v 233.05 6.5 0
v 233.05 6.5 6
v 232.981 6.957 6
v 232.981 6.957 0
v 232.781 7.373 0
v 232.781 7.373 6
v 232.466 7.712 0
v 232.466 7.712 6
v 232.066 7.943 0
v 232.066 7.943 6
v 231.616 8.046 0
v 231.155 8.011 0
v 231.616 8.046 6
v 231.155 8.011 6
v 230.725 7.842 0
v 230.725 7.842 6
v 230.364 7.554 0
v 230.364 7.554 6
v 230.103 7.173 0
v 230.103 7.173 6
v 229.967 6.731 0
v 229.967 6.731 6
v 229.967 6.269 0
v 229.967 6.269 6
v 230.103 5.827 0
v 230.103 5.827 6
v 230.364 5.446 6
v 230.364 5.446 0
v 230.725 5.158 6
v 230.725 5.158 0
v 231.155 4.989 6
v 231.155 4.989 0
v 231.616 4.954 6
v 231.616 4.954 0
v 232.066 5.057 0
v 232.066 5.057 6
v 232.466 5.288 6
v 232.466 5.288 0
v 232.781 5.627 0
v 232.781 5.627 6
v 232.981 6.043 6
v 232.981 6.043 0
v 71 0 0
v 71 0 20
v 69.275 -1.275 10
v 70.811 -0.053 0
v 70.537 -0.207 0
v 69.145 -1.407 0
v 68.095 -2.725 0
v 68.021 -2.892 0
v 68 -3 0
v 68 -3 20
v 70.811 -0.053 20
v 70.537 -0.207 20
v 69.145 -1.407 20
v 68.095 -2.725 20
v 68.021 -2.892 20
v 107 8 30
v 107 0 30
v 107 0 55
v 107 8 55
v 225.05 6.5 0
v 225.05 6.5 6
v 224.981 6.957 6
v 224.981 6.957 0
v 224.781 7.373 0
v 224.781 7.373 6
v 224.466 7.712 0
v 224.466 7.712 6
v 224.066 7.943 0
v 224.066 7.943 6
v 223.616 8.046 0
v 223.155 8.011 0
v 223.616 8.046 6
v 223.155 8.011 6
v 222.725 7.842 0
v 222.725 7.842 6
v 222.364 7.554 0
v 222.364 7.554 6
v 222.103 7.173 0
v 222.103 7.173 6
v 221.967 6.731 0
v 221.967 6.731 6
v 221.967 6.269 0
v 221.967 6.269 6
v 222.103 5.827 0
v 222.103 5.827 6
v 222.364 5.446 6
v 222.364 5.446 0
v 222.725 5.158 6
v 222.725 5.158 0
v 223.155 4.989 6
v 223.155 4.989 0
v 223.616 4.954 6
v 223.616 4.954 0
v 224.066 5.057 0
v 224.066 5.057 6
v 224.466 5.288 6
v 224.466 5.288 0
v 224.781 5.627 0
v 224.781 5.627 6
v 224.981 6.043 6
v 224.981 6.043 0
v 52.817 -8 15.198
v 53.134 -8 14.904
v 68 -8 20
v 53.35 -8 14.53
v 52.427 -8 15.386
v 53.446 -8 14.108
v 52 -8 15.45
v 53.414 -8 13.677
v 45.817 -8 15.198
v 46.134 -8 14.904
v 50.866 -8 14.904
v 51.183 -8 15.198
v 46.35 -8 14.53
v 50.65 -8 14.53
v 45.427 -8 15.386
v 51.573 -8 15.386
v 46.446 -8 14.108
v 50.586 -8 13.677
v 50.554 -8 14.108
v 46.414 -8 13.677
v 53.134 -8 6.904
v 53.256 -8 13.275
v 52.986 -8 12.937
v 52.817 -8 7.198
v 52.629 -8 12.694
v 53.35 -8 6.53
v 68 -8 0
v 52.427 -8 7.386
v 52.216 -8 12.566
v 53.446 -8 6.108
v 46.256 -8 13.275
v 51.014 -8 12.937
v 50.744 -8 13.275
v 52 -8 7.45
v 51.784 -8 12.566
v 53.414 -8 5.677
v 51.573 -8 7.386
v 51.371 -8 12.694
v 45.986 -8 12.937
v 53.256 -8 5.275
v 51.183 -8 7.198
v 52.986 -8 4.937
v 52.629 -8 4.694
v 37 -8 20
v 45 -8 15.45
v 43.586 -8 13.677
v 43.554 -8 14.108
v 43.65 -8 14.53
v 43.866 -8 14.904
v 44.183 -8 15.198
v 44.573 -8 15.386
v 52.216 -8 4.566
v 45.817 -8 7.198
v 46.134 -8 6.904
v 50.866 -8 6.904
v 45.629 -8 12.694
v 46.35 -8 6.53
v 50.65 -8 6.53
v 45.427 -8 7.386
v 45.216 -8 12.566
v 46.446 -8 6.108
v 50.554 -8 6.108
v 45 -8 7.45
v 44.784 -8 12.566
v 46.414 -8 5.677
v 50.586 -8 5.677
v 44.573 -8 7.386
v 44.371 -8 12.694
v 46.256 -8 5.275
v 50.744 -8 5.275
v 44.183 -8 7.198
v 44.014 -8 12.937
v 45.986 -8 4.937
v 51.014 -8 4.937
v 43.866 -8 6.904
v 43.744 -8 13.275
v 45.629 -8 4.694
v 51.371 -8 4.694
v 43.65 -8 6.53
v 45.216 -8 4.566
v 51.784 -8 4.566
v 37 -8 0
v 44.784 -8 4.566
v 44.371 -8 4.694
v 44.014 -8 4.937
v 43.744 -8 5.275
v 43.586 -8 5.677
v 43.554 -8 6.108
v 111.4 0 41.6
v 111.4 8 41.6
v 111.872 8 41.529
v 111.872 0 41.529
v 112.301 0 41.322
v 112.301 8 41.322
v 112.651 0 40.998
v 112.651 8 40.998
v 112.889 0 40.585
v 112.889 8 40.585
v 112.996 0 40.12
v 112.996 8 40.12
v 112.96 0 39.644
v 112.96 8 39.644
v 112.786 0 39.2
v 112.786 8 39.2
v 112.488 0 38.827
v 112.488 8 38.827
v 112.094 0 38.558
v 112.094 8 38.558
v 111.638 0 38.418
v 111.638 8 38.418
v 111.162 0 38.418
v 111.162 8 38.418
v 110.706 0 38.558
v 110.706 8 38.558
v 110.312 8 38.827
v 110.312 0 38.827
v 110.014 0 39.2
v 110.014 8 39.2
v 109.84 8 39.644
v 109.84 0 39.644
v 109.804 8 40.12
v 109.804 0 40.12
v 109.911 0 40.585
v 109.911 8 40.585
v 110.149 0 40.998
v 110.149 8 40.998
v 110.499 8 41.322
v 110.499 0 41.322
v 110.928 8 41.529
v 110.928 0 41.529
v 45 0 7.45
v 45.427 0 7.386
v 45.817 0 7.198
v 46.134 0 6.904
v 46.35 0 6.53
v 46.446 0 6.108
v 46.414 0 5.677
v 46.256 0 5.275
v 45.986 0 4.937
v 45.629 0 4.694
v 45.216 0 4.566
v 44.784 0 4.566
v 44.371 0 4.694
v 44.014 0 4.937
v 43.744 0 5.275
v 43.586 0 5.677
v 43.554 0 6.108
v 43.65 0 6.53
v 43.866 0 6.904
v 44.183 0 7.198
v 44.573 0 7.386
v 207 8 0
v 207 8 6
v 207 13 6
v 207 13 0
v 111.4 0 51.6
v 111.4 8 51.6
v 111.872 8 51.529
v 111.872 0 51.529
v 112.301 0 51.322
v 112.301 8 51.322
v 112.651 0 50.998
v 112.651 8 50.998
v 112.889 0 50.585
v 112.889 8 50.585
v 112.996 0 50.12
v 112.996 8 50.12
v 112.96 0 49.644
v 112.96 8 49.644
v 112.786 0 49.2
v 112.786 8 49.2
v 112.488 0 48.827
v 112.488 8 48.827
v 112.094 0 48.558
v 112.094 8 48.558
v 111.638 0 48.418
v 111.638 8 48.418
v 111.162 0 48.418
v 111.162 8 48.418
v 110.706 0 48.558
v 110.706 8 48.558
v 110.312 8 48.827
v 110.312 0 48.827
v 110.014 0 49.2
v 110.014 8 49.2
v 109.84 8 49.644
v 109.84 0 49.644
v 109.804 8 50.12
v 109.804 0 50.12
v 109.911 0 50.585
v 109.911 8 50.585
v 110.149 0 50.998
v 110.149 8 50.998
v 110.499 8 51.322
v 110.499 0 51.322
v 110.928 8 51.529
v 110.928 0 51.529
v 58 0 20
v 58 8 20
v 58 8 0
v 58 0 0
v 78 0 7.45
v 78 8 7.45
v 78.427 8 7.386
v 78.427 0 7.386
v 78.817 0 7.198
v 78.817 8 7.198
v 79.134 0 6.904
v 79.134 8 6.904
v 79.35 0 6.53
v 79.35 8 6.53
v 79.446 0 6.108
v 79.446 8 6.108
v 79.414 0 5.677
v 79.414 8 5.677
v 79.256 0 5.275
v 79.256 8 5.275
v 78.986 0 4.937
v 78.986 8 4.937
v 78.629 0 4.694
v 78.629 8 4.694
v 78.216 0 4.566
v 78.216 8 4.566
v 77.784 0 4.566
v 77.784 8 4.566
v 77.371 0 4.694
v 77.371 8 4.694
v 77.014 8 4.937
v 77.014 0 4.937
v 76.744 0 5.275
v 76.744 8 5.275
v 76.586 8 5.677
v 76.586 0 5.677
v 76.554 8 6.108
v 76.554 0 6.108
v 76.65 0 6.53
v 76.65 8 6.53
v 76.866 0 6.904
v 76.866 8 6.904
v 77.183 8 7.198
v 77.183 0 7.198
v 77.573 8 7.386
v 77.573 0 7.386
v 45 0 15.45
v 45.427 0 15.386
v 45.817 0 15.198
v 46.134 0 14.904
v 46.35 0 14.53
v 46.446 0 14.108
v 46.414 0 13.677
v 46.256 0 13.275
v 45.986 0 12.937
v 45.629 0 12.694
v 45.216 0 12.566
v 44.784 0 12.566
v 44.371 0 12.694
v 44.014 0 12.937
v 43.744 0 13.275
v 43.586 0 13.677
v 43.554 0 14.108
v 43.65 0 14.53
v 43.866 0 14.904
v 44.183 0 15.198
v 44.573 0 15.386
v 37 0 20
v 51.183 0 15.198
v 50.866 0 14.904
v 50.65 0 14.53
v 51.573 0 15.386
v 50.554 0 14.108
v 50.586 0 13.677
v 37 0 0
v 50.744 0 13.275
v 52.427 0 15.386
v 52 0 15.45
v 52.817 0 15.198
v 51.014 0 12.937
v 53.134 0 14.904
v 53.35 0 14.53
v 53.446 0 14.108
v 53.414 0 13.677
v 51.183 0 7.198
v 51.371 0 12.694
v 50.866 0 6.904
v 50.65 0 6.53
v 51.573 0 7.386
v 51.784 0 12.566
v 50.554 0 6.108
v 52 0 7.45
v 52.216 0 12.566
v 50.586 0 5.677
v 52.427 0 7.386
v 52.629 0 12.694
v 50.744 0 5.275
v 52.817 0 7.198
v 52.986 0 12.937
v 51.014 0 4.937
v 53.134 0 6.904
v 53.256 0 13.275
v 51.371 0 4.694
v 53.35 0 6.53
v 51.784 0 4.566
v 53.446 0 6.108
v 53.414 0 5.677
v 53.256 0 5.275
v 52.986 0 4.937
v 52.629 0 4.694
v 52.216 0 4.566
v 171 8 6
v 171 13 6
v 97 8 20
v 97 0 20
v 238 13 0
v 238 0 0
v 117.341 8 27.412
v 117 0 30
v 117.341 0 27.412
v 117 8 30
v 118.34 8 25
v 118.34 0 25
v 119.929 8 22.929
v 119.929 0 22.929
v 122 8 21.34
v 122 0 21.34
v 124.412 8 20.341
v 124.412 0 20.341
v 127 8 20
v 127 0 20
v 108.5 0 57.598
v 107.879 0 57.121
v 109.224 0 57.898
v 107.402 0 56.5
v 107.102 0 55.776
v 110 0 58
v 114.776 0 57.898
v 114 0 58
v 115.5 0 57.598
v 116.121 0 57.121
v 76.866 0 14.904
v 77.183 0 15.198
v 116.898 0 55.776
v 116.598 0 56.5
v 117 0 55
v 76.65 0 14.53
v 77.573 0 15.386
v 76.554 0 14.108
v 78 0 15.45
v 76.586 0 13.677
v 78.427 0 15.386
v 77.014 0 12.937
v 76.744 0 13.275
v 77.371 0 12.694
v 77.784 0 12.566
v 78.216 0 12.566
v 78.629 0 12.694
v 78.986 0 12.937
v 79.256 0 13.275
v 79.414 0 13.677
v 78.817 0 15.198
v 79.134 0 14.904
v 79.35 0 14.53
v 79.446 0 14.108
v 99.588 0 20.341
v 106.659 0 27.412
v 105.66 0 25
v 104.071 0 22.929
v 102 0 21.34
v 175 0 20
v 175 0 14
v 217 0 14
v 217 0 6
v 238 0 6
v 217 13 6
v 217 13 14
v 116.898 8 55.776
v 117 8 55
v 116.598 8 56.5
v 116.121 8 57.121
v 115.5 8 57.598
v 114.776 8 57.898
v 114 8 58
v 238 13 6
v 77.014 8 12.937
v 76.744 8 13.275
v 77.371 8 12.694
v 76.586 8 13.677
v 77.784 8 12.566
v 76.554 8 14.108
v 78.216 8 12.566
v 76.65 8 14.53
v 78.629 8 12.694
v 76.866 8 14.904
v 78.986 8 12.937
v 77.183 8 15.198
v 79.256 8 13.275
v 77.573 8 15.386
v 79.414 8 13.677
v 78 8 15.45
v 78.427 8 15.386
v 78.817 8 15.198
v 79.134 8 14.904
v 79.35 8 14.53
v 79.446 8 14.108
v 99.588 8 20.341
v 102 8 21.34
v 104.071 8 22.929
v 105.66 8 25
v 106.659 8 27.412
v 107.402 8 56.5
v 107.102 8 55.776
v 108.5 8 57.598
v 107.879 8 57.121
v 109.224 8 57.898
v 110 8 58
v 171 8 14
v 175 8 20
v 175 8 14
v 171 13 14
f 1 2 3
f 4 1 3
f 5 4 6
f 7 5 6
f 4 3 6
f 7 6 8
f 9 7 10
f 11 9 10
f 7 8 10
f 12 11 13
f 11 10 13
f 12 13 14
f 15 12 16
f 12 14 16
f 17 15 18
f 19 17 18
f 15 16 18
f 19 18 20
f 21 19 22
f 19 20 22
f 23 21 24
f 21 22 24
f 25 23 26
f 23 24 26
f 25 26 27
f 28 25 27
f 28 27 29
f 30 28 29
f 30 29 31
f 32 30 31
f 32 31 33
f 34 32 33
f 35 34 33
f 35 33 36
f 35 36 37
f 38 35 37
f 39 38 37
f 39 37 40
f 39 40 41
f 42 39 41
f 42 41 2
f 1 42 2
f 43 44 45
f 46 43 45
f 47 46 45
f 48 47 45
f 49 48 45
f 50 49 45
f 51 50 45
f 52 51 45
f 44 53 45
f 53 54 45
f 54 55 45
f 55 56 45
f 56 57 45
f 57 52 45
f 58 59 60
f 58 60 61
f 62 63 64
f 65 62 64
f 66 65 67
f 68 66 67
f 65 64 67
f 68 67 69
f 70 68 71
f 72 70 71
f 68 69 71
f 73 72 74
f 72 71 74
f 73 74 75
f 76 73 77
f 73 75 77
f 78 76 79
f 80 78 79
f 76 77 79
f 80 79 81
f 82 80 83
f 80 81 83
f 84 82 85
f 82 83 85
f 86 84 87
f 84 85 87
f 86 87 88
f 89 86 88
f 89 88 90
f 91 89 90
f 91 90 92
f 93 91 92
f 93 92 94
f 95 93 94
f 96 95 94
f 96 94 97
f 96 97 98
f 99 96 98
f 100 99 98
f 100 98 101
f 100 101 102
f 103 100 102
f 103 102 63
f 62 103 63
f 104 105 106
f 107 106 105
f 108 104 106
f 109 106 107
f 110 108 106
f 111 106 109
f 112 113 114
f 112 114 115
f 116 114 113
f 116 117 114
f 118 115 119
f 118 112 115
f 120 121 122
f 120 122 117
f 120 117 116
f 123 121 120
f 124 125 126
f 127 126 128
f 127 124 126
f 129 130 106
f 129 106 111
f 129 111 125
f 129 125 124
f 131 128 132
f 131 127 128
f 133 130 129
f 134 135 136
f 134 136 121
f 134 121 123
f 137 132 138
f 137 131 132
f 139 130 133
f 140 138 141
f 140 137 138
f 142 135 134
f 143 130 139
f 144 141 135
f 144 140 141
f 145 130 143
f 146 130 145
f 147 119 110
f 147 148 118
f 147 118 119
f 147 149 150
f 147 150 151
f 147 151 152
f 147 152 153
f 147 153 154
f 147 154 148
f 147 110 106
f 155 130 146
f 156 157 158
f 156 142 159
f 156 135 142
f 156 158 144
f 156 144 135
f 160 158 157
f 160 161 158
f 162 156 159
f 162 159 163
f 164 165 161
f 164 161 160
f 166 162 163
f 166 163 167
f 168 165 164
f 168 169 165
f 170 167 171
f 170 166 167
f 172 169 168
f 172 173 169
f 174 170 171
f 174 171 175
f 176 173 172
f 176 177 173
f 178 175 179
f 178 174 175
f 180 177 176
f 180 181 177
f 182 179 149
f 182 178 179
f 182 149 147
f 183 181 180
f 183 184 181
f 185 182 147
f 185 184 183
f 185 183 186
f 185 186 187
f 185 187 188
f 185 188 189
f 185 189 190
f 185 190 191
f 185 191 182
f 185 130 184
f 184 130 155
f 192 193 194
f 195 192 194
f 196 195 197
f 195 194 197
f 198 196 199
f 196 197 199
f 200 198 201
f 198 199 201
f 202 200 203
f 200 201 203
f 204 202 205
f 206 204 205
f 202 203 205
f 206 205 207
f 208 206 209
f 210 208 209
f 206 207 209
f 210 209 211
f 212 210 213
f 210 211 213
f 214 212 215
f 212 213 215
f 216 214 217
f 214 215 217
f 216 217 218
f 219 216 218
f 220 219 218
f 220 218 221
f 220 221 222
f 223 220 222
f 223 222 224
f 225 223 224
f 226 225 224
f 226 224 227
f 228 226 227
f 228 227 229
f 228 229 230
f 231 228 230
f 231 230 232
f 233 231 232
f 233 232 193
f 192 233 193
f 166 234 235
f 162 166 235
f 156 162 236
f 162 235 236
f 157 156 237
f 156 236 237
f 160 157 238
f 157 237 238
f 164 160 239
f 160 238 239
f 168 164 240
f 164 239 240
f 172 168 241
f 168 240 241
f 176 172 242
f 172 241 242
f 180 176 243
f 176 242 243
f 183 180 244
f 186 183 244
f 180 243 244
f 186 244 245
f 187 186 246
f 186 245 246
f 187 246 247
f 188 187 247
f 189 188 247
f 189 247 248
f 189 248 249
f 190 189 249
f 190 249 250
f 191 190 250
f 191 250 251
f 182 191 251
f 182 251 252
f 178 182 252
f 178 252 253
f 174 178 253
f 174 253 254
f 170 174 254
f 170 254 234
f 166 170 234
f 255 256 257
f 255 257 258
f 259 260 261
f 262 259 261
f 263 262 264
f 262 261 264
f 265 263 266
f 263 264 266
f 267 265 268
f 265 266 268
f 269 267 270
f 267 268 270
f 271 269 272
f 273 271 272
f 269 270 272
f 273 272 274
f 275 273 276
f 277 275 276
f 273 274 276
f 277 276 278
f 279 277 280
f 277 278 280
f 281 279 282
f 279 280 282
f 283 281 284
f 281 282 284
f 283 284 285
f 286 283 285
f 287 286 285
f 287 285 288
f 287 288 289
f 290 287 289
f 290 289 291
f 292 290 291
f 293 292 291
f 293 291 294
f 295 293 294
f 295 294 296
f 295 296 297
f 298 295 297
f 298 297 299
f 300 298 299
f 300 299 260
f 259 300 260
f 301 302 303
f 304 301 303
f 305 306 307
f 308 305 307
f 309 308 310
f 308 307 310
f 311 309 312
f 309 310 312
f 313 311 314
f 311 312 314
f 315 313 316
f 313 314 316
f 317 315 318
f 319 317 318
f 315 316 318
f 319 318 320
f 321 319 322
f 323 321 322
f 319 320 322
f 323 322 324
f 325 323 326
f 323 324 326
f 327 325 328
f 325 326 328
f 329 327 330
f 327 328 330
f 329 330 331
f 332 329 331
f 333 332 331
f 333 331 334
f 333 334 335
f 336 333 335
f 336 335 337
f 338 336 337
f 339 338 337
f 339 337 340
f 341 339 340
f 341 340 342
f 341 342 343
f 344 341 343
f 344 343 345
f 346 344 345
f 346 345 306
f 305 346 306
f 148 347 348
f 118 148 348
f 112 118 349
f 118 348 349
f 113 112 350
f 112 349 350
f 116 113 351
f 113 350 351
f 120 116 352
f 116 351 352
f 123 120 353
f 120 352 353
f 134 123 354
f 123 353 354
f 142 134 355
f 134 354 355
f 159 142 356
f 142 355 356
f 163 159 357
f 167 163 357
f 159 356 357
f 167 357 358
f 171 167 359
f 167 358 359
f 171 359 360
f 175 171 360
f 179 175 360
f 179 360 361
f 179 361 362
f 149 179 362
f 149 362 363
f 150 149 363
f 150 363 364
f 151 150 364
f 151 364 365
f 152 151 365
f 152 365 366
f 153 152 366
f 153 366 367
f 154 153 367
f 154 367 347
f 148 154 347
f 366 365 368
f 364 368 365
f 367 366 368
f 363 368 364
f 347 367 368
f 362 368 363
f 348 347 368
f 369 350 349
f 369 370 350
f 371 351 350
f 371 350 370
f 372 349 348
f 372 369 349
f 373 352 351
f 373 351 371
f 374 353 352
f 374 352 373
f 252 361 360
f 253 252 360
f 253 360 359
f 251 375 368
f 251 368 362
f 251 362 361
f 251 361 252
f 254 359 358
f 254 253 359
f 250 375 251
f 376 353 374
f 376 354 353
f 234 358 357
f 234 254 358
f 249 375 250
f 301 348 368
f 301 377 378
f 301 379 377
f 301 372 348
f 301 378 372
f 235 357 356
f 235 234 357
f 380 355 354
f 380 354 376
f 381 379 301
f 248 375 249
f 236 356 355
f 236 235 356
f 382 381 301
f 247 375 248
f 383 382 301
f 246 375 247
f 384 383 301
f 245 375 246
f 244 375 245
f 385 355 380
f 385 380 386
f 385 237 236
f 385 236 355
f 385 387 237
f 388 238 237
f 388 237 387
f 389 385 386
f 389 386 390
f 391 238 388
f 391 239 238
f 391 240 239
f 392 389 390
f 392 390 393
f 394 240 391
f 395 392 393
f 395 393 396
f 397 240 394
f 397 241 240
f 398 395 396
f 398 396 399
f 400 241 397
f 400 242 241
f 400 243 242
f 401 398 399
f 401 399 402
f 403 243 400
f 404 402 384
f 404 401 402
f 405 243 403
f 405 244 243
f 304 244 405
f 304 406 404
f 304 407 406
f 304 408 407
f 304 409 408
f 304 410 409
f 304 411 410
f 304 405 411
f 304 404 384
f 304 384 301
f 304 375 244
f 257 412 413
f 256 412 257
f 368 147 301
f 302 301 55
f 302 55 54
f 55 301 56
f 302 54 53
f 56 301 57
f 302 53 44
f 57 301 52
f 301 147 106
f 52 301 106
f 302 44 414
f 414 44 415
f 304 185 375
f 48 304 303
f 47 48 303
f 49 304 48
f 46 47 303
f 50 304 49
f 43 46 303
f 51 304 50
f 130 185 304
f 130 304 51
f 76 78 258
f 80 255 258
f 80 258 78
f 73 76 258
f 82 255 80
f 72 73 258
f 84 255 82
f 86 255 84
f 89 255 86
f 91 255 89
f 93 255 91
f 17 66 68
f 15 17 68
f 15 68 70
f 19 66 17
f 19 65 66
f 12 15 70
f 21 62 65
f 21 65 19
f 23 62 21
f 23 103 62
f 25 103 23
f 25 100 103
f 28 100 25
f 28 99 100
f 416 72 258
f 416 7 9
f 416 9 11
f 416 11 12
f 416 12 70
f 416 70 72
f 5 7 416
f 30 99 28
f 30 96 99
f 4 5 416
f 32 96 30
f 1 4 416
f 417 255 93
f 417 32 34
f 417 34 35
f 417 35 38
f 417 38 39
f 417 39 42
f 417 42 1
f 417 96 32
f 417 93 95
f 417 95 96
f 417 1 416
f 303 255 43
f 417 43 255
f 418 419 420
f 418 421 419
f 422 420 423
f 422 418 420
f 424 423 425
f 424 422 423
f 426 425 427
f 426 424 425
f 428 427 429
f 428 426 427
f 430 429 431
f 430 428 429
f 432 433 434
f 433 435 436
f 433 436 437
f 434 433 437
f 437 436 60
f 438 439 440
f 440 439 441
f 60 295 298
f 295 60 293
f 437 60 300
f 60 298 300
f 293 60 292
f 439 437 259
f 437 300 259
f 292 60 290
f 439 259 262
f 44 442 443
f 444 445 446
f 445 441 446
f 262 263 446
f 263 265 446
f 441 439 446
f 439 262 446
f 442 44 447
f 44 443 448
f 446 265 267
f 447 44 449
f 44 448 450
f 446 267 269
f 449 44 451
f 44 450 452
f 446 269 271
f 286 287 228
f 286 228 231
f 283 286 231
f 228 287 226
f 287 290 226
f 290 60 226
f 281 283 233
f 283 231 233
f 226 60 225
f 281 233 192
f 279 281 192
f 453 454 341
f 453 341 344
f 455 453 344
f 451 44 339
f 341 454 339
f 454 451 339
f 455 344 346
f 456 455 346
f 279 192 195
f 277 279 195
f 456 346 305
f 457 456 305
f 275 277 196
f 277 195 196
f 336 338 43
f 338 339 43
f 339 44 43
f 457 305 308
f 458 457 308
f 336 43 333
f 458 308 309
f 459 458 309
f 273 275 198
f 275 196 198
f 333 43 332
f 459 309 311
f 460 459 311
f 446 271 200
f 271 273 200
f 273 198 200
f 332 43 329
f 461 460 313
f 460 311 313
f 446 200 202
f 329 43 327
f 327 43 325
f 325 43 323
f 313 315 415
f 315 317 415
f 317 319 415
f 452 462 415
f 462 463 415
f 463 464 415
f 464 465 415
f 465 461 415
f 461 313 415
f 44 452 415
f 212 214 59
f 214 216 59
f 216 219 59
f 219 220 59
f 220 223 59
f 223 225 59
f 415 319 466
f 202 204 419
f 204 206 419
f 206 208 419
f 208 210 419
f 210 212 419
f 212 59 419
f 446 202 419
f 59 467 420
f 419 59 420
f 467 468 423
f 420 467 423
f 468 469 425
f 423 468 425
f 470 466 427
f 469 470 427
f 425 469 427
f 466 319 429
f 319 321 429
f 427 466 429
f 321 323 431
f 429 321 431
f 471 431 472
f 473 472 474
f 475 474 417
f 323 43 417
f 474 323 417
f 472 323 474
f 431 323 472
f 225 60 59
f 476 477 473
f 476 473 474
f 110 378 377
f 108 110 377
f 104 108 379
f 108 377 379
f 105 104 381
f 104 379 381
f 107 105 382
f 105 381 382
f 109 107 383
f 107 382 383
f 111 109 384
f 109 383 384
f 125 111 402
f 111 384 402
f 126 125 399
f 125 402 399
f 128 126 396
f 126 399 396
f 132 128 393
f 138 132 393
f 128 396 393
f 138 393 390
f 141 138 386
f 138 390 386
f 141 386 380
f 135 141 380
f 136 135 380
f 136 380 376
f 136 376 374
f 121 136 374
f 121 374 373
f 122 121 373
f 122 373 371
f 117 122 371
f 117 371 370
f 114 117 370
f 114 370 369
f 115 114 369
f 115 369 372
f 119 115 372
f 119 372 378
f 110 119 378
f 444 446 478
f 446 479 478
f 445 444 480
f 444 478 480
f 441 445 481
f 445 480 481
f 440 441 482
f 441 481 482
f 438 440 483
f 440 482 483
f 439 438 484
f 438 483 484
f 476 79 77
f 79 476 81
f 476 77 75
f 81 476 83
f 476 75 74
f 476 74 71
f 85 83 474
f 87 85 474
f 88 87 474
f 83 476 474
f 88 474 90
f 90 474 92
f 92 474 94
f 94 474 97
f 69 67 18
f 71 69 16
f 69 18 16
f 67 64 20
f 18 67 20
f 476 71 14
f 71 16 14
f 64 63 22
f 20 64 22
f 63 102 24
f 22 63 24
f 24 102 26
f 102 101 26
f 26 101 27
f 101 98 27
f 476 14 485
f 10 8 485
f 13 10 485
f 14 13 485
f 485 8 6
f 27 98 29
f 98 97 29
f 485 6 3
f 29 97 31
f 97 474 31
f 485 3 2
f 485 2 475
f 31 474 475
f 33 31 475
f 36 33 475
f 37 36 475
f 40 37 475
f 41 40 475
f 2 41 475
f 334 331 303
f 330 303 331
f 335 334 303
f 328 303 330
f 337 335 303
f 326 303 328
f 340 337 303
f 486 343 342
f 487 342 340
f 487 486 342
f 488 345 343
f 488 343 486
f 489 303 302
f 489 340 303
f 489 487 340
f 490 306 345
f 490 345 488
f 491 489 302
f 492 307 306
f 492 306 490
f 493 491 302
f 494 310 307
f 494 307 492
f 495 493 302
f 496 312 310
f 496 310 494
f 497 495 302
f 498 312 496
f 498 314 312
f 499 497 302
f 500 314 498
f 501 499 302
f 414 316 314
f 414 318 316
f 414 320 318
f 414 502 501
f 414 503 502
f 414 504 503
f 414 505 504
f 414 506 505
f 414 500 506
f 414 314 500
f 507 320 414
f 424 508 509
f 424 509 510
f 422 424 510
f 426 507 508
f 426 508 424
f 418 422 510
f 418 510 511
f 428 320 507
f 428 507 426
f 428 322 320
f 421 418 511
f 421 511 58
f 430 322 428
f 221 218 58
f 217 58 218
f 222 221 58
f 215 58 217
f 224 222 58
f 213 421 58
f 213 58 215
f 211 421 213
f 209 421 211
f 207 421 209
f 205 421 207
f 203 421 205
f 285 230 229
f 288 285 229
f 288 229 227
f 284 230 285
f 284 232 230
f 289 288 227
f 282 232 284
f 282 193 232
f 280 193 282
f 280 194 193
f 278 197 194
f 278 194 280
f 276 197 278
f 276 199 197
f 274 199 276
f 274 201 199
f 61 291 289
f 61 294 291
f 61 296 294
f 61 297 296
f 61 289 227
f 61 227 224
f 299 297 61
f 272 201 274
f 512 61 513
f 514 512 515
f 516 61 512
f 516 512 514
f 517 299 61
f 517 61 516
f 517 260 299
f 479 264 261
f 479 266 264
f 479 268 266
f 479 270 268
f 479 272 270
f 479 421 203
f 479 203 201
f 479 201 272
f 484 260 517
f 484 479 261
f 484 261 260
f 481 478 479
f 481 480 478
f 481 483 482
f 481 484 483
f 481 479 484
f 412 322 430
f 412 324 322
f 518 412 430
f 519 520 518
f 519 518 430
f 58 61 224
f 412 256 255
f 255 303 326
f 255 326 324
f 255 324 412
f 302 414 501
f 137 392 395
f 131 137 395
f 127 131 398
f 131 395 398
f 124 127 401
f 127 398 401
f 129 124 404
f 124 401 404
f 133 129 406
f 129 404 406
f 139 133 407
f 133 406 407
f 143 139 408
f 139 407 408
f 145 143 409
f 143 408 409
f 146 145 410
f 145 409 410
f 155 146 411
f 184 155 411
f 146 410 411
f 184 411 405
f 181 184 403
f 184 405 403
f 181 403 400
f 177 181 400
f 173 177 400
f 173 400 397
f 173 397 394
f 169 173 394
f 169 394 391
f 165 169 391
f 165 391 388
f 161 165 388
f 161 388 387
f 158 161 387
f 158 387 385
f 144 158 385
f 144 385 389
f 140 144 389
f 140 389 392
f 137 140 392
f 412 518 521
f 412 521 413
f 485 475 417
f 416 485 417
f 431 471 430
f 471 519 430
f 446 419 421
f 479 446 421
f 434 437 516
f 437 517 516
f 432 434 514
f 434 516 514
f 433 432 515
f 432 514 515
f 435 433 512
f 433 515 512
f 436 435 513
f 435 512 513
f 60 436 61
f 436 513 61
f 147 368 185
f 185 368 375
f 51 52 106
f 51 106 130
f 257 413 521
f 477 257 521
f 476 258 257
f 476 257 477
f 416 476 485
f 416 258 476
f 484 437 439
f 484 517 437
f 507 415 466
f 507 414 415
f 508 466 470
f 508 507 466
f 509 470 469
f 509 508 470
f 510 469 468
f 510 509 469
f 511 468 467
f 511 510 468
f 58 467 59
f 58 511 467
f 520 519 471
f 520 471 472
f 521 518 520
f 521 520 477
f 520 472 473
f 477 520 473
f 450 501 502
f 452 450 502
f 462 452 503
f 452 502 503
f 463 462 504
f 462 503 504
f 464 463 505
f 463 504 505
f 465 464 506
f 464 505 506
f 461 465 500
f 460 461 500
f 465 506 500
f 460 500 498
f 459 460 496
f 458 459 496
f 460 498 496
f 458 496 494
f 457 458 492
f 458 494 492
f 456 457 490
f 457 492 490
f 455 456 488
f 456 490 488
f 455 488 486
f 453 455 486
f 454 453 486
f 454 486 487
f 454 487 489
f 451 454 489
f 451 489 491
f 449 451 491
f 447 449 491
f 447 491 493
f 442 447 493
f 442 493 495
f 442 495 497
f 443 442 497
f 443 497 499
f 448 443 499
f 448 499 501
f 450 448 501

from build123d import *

# Parameters (mm, degrees)
SKETCH1_W                 = 300
SKETCH1_H                 = 20
BOSS_EXTRUDE1_DEPTH       = 8
SKETCH2_W                 = 34
SKETCH2_H                 = 8
BOSS_EXTRUDE2_DEPTH       = 9
SKETCH3_W                 = 34
SKETCH3_H                 = 8
BOSS_EXTRUDE3_DEPTH       = 9
SKETCH4_R                 = 1.45
CUT_EXTRUDE1_DEPTH        = 302.504560496
SKETCH5_W                 = 25
SKETCH5_H                 = 8
BOSS_EXTRUDE4_DEPTH       = 17
SKETCH6_W                 = 25
SKETCH6_H                 = 8
BOSS_EXTRUDE5_DEPTH       = 17
SKETCH12_W                = 8
SKETCH12_H                = 8
BOSS_EXTRUDE7_DEPTH       = 17
BOSS_EXTRUDE8_DEPTH       = 12
SKETCH15_R                = 1.6
CUT_EXTRUDE7_DEPTH        = 20
SKETCH16_W                = 20
SKETCH16_H                = 13
BOSS_EXTRUDE9_DEPTH       = 12
SKETCH17_R                = 1.6
CUT_EXTRUDE8_DEPTH        = 20
SKETCH18_W                = 20
SKETCH18_H                = 13
BOSS_EXTRUDE10_DEPTH      = 12
CUT_EXTRUDE9_START        = -20
SKETCH19_R                = 1.6
CUT_EXTRUDE9_DEPTH        = 20
SKETCH20_W                = 20
SKETCH20_H                = 13
BOSS_EXTRUDE11_DEPTH      = 12
CUT_EXTRUDE10_START       = -20
SKETCH21_R                = 1.6
CUT_EXTRUDE10_DEPTH       = 20
SKETCH22_W                = 10
SKETCH22_H                = 38
CUT_EXTRUDE11_DEPTH       = 306.0983448
SKETCH23_W                = 8
SKETCH23_H                = 18
CUT_EXTRUDE12_DEPTH       = 4
BOSS_EXTRUDE12_DEPTH      = 10
BOSS_EXTRUDE13_DEPTH      = 8
SKETCH26_W                = 8
SKETCH26_H                = 48
BOSS_EXTRUDE14_DEPTH      = 14
SKETCH27_W                = 8
SKETCH27_H                = 16
BOSS_EXTRUDE15_DEPTH      = 14
SKETCH28_W                = 8
SKETCH28_H                = 40
CUT_EXTRUDE13_DEPTH       = 14
SKETCH30_W                = 16
SKETCH30_H                = 14
BOSS_EXTRUDE16_DEPTH      = 9
SKETCH31_W                = 17
SKETCH31_H                = 8
CUT_EXTRUDE14_DEPTH       = 5
SKETCH32_W                = 16
SKETCH32_H                = 9
CUT_EXTRUDE15_DEPTH       = 9
CUT_EXTRUDE16_DEPTH       = 10
SKETCH34_W                = 7
SKETCH34_H                = 5
CUT_EXTRUDE17_DEPTH       = 5
SKETCH35_W                = 7
SKETCH35_H                = 5
BOSS_EXTRUDE17_DEPTH      = 5
SKETCH36_R                = 1.7
CUT_EXTRUDE18_DEPTH       = 307.014705529
SKETCH37_W                = 70
SKETCH37_H                = 8
BOSS_EXTRUDE18_DEPTH      = 5
SKETCH39_W                = 66
SKETCH39_H                = 6
CUT_EXTRUDE19_DEPTH       = 306.14258962
SKETCH40_W                = 20
SKETCH40_H                = 12
BOSS_EXTRUDE19_DEPTH      = 10
BOSS_EXTRUDE20_DEPTH      = 5
BOSS_EXTRUDE20_DEPTH_BACK = 5
SKETCH41_W                = 28
SKETCH41_H                = 12
SKETCH42_R                = 1.5
CUT_EXTRUDE20_DEPTH       = 15
SKETCH43_W                = 20
SKETCH43_H                = 12
BOSS_EXTRUDE21_DEPTH      = 10
BOSS_EXTRUDE22_DEPTH      = 5
BOSS_EXTRUDE22_DEPTH_BACK = 5
SKETCH44_W                = 28
SKETCH44_H                = 12
SKETCH45_R                = 1.5
CUT_EXTRUDE21_DEPTH       = 15
SKETCH46_W                = 20
SKETCH46_H                = 12
SKETCH46_W_2              = 19.974984355
BOSS_EXTRUDE23_DEPTH      = 10
BOSS_EXTRUDE24_DEPTH      = 5
BOSS_EXTRUDE24_DEPTH_BACK = 5
SKETCH47_W                = 28
SKETCH47_H                = 12
SKETCH47_W_2              = 28.025015645
CUT_EXTRUDE22_START       = -15
SKETCH48_R                = 1.5
CUT_EXTRUDE22_DEPTH       = 15
FILLET1_R                 = 5
FILLET2_R                 = 2.5
FILLET3_R                 = 3
FILLET4_R                 = 3
SKETCH49_R                = 1.45
CUT_EXTRUDE23_DEPTH       = 309.139578763
SKETCH50_W                = 97.606758594
SKETCH50_H                = 58.271300894
CUT_EXTRUDE24_DEPTH       = 40
SKETCH51_W                = 104.080215225
SKETCH51_H                = 68.777983442
CUT_EXTRUDE25_DEPTH       = 65
SKETCH54_W                = 8
SKETCH54_H                = 13
CUT_EXTRUDE26_DEPTH       = 21
SKETCH55_W                = 31
SKETCH55_H                = 6
BOSS_EXTRUDE26_DEPTH      = 5
SKETCH56_R                = 1.55
CUT_EXTRUDE27_DEPTH       = 239.765575408
SKETCH57_W                = 31
SKETCH57_H                = 20
BOSS_EXTRUDE27_DEPTH      = 8
SKETCH58_W                = 21
SKETCH58_H                = 20
CUT_EXTRUDE28_DEPTH       = 8
SKETCH59_R                = 1.45
CUT_EXTRUDE29_DEPTH       = 240.192391183
SKETCH60_W                = 10
SKETCH60_H                = 8
BOSS_EXTRUDE28_DEPTH      = 38
SKETCH61_R                = 1.6
CUT_EXTRUDE30_DEPTH       = 246.487270546
FILLET5_R                 = 10
FILLET6_SIZE              = 3
FILLET7_R                 = 3


with BuildPart() as part:
    # Sketch1 → Boss-Extrude1 (new body)
    with BuildSketch(Plane(origin=(0, 0, 0), x_dir=(1, 0, 0), z_dir=(0, 1, 0))):
        with Locations((150, -10)):
            Rectangle(SKETCH1_W, SKETCH1_H)
    extrude(amount=BOSS_EXTRUDE1_DEPTH)

    # Sketch2 → Boss-Extrude2 (add)
    with BuildSketch(Plane.XY.offset(20)):
        with Locations((17, 4)):
            Rectangle(SKETCH2_W, SKETCH2_H)
        with Locations((283, 4)):
            Rectangle(SKETCH2_W, SKETCH2_H)
    extrude(amount=BOSS_EXTRUDE2_DEPTH)

    # Sketch3 → Boss-Extrude3 (add)
    with BuildSketch(Plane(origin=(0, 0, 0), x_dir=(-1, 0, 0), z_dir=(0, 0, -1))):
        with Locations((-17, 4)):
            Rectangle(SKETCH3_W, SKETCH3_H)
        with Locations((-283, 4)):
            Rectangle(SKETCH3_W, SKETCH3_H)
    extrude(amount=BOSS_EXTRUDE3_DEPTH)

    # Sketch4 → Cut-Extrude1 (cut, through all)
    with BuildSketch(Plane(origin=(0, 8, 0), x_dir=(1, 0, 0), z_dir=(0, 1, 0))):
        with Locations(Location((4, 5, 0), (0, 0, 270))):
            Circle(SKETCH4_R)
        with Locations(Location((30, 5, 0), (0, 0, 270))):
            Circle(SKETCH4_R)
        with Locations(Location((30, -25, 0), (0, 0, 270))):
            Circle(SKETCH4_R)
        with Locations(Location((4, -25, 0), (0, 0, 270))):
            Circle(SKETCH4_R)
        with Locations(Location((296, -25, 0), (0, 0, 270))):
            Circle(SKETCH4_R)
        with Locations(Location((296, 5, 0), (0, 0, 270))):
            Circle(SKETCH4_R)
        with Locations(Location((270, -25, 0), (0, 0, 270))):
            Circle(SKETCH4_R)
        with Locations(Location((270, 5, 0), (0, 0, 270))):
            Circle(SKETCH4_R)
    extrude(amount=-CUT_EXTRUDE1_DEPTH, mode=Mode.SUBTRACT)

    # Sketch5 → Boss-Extrude4 (add)
    with BuildSketch(Plane.XY.offset(20)):
        with Locations((253.5, 4)):
            Rectangle(SKETCH5_W, SKETCH5_H)
    extrude(amount=BOSS_EXTRUDE4_DEPTH)

    # Sketch6 → Boss-Extrude5 (add)
    with BuildSketch(Plane(origin=(0, 0, 0), x_dir=(-1, 0, 0), z_dir=(0, 0, -1))):
        with Locations((-253.5, 4)):
            Rectangle(SKETCH6_W, SKETCH6_H)
    extrude(amount=BOSS_EXTRUDE5_DEPTH)

    # Sketch12 → Boss-Extrude7 (add)
    with BuildSketch(Plane.XY.offset(37)):
        with Locations((245, 4)):
            Rectangle(SKETCH12_W, SKETCH12_H)
    extrude(amount=BOSS_EXTRUDE7_DEPTH)

    # Sketch14 → Boss-Extrude8 (add)
    with BuildSketch(Plane.XY.offset(29)):
        Polygon((294.974984355, 8), (275, 8), (275, -4), (294.974984355, -5), align=None)
    extrude(amount=BOSS_EXTRUDE8_DEPTH)

    # Sketch15 → Cut-Extrude7 (cut)
    with BuildSketch(Plane(origin=(294.974984355, 0, 0), x_dir=(0, 0, -1), z_dir=(1, 0, 0))):
        with Locations((-35, 0)):
            Circle(SKETCH15_R)
    extrude(amount=-CUT_EXTRUDE7_DEPTH, mode=Mode.SUBTRACT)

    # Sketch16 → Boss-Extrude9 (add)
    with BuildSketch(Plane(origin=(0, 0, -9), x_dir=(-1, 0, 0), z_dir=(0, 0, -1))):
        with Locations((-285, 1.5)):
            Rectangle(SKETCH16_W, SKETCH16_H)
    extrude(amount=BOSS_EXTRUDE9_DEPTH)

    # Sketch17 → Cut-Extrude8 (cut)
    with BuildSketch(Plane(origin=(295, 0, 0), x_dir=(0, 0, -1), z_dir=(1, 0, 0))):
        with Locations((15, 0)):
            Circle(SKETCH17_R)
    extrude(amount=-CUT_EXTRUDE8_DEPTH, mode=Mode.SUBTRACT)

    # Sketch18 → Boss-Extrude10 (add)
    with BuildSketch(Plane(origin=(0, 0, -9), x_dir=(-1, 0, 0), z_dir=(0, 0, -1))):
        with Locations((-15, 1.5)):
            Rectangle(SKETCH18_W, SKETCH18_H)
    extrude(amount=BOSS_EXTRUDE10_DEPTH)

    # Sketch19 → Cut-Extrude9 (cut)
    with BuildSketch(Plane.ZY.offset(-5).offset(CUT_EXTRUDE9_START)):
        with Locations(Location((-15, 0, 0), (0, 0, 180))):
            Circle(SKETCH19_R)
    extrude(amount=CUT_EXTRUDE9_DEPTH, mode=Mode.SUBTRACT)

    # Sketch20 → Boss-Extrude11 (add)
    with BuildSketch(Plane.XY.offset(29)):
        with Locations((15, 1.5)):
            Rectangle(SKETCH20_W, SKETCH20_H)
    extrude(amount=BOSS_EXTRUDE11_DEPTH)

    # Sketch21 → Cut-Extrude10 (cut)
    with BuildSketch(Plane.ZY.offset(-5).offset(CUT_EXTRUDE10_START)):
        with Locations(Location((35, 0, 0), (0, 0, 180))):
            Circle(SKETCH21_R)
    extrude(amount=CUT_EXTRUDE10_DEPTH, mode=Mode.SUBTRACT)

    # Sketch22 → Cut-Extrude11 (cut, through all)
    with BuildSketch(Plane(origin=(0, 8, 0), x_dir=(1, 0, 0), z_dir=(0, 1, 0))):
        with Locations((254, -10)):
            Rectangle(SKETCH22_W, SKETCH22_H)
    extrude(amount=-CUT_EXTRUDE11_DEPTH, mode=Mode.SUBTRACT)

    # Sketch23 → Cut-Extrude12 (cut)
    with BuildSketch(Plane(origin=(0, 0, 0), x_dir=(-1, 0, 0), z_dir=(0, -1, 0))):
        with Locations((-263, -10)):
            Rectangle(SKETCH23_W, SKETCH23_H)
    extrude(amount=-CUT_EXTRUDE12_DEPTH, mode=Mode.SUBTRACT)

    # Sketch24 → Boss-Extrude12 (add)
    with BuildSketch(Plane.ZY.offset(-259)):
        Polygon((-9, 0), (-9, 8), (-1, 8), align=None)
        Polygon((29, 0), (29, 8), (21, 8), align=None)
    extrude(amount=BOSS_EXTRUDE12_DEPTH)

    # Sketch25 → Boss-Extrude13 (add)
    with BuildSketch(Plane.ZY.offset(-267)):
        Polygon((19, 0), (19, 4), (15, 4), align=None)
        Polygon((1, 4), (5, 4), (1, 0), align=None)
    extrude(amount=BOSS_EXTRUDE13_DEPTH)

    # Sketch26 → Boss-Extrude14 (add)
    with BuildSketch(Plane(origin=(0, 8, 0), x_dir=(1, 0, 0), z_dir=(0, 1, 0))):
        with Locations((245, -30)):
            Rectangle(SKETCH26_W, SKETCH26_H)
    extrude(amount=BOSS_EXTRUDE14_DEPTH)

    # Sketch27 → Boss-Extrude15 (add)
    with BuildSketch(Plane(origin=(0, 8, 0), x_dir=(1, 0, 0), z_dir=(0, 1, 0))):
        with Locations((253, -29)):
            Rectangle(SKETCH27_W, SKETCH27_H)
    extrude(amount=BOSS_EXTRUDE15_DEPTH)

    # Sketch28 → Cut-Extrude13 (cut)
    with BuildSketch(Plane.XZ):
        with Locations((245, 34)):
            Rectangle(SKETCH28_W, SKETCH28_H)
    extrude(amount=-CUT_EXTRUDE13_DEPTH, mode=Mode.SUBTRACT)

    # Sketch30 → Boss-Extrude16 (add)
    with BuildSketch(Plane(origin=(257, 0, 0), x_dir=(0, 0, -1), z_dir=(1, 0, 0))):
        with Locations((-29, 15)):
            Rectangle(SKETCH30_W, SKETCH30_H)
    extrude(amount=BOSS_EXTRUDE16_DEPTH)

    # Sketch31 → Cut-Extrude14 (cut)
    with BuildSketch(Plane(origin=(0, 0, 0), x_dir=(-1, 0, 0), z_dir=(0, -1, 0))):
        with Locations((-257.5, -33)):
            Rectangle(SKETCH31_W, SKETCH31_H)
    extrude(amount=-CUT_EXTRUDE14_DEPTH, mode=Mode.SUBTRACT)

    # Sketch32 → Cut-Extrude15 (cut)
    with BuildSketch(Plane(origin=(266, 0, 0), x_dir=(0, 0, -1), z_dir=(1, 0, 0))):
        with Locations((-29, 17.5)):
            Rectangle(SKETCH32_W, SKETCH32_H)
    extrude(amount=-CUT_EXTRUDE15_DEPTH, mode=Mode.SUBTRACT)

    # Sketch33 → Cut-Extrude16 (cut)
    with BuildSketch(Plane.ZY.offset(-249)):
        Polygon((29, 5), (24, 5), (29, 0), align=None)
    extrude(amount=-CUT_EXTRUDE16_DEPTH, mode=Mode.SUBTRACT)

    # Sketch34 → Cut-Extrude17 (cut)
    with BuildSketch(Plane.XY.offset(29)):
        with Locations((262.5, 2.5)):
            Rectangle(SKETCH34_W, SKETCH34_H)
    extrude(amount=-CUT_EXTRUDE17_DEPTH, mode=Mode.SUBTRACT)

    # Sketch35 → Boss-Extrude17 (add)
    with BuildSketch(Plane(origin=(0, 0, 21), x_dir=(-1, 0, 0), z_dir=(0, 0, -1))):
        with Locations((-262.5, 10.5)):
            Rectangle(SKETCH35_W, SKETCH35_H)
    extrude(amount=BOSS_EXTRUDE17_DEPTH)

    # Sketch36 → Cut-Extrude18 (cut, through all)
    with BuildSketch(Plane(origin=(0, 22, 0), x_dir=(1, 0, 0), z_dir=(0, 1, 0))):
        with Locations(Location((245, -50, 0), (0, 0, 270))):
            Circle(SKETCH36_R)
        with Locations(Location((245, -18, 0), (0, 0, 270))):
            Circle(SKETCH36_R)
    extrude(amount=-CUT_EXTRUDE18_DEPTH, mode=Mode.SUBTRACT)

    # Sketch37 → Boss-Extrude18 (add)
    with BuildSketch(Plane(origin=(0, 8, 0), x_dir=(1, 0, 0), z_dir=(0, 1, 0))):
        with Locations((206, -10)):
            Rectangle(SKETCH37_W, SKETCH37_H)
    extrude(amount=BOSS_EXTRUDE18_DEPTH)

    # Sketch39 → Cut-Extrude19 (cut, through all)
    with BuildSketch(Plane(origin=(0, 8, 0), x_dir=(1, 0, 0), z_dir=(0, 1, 0))):
        with Locations((208, -17)):
            Rectangle(SKETCH39_W, SKETCH39_H)
    extrude(amount=-CUT_EXTRUDE19_DEPTH, mode=Mode.SUBTRACT)

    # Sketch40 → Boss-Extrude19 (add)
    with BuildSketch(Plane(origin=(0, 8, 0), x_dir=(1, 0, 0), z_dir=(0, 1, 0))):
        with Locations((15, 15)):
            Rectangle(SKETCH40_W, SKETCH40_H)
    extrude(amount=BOSS_EXTRUDE19_DEPTH)

    # Sketch41 → Boss-Extrude20 (add, two sides: drawn at the far end of the back side and taken through both)
    with BuildSketch(Plane(origin=(0, 18, 0), x_dir=(1, 0, 0), z_dir=(0, 1, 0)).offset(-BOSS_EXTRUDE20_DEPTH_BACK)):
        with Locations((11, 15)):
            Rectangle(SKETCH41_W, SKETCH41_H)
    extrude(amount=BOSS_EXTRUDE20_DEPTH + BOSS_EXTRUDE20_DEPTH_BACK)

    # Sketch42 → Cut-Extrude20 (cut)
    with BuildSketch(Plane.ZY.offset(3)):
        with Locations((-14, 18)):
            Circle(SKETCH42_R)
    extrude(amount=-CUT_EXTRUDE20_DEPTH, mode=Mode.SUBTRACT)

    # Sketch43 → Boss-Extrude21 (add)
    with BuildSketch(Plane(origin=(0, 8, 0), x_dir=(1, 0, 0), z_dir=(0, 1, 0))):
        with Locations((15, -35)):
            Rectangle(SKETCH43_W, SKETCH43_H)
    extrude(amount=BOSS_EXTRUDE21_DEPTH)

    # Sketch44 → Boss-Extrude22 (add, two sides: drawn at the far end of the back side and taken through both)
    with BuildSketch(Plane(origin=(0, 18, 0), x_dir=(1, 0, 0), z_dir=(0, 1, 0)).offset(-BOSS_EXTRUDE22_DEPTH_BACK)):
        with Locations((11, -35)):
            Rectangle(SKETCH44_W, SKETCH44_H)
    extrude(amount=BOSS_EXTRUDE22_DEPTH + BOSS_EXTRUDE22_DEPTH_BACK)

    # Sketch45 → Cut-Extrude21 (cut)
    with BuildSketch(Plane.ZY.offset(3)):
        with Locations((36, 18)):
            Circle(SKETCH45_R)
    extrude(amount=-CUT_EXTRUDE21_DEPTH, mode=Mode.SUBTRACT)

    # Sketch46 → Boss-Extrude23 (add)
    with BuildSketch(Plane(origin=(0, 8, 0), x_dir=(1, 0, 0), z_dir=(0, 1, 0))):
        with Locations((285, 15)):
            Rectangle(SKETCH46_W, SKETCH46_H)
        with Locations((284.987492178, -35)):
            Rectangle(SKETCH46_W_2, SKETCH46_H)
    extrude(amount=BOSS_EXTRUDE23_DEPTH)

    # Sketch47 → Boss-Extrude24 (add, two sides: drawn at the far end of the back side and taken through both)
    with BuildSketch(Plane(origin=(0, 18, 0), x_dir=(1, 0, 0), z_dir=(0, 1, 0)).offset(-BOSS_EXTRUDE24_DEPTH_BACK)):
        with Locations((289, 15)):
            Rectangle(SKETCH47_W, SKETCH47_H)
        with Locations((288.987492178, -35)):
            Rectangle(SKETCH47_W_2, SKETCH47_H)
    extrude(amount=BOSS_EXTRUDE24_DEPTH + BOSS_EXTRUDE24_DEPTH_BACK)

    # Sketch48 → Cut-Extrude22 (cut)
    with BuildSketch(Plane(origin=(303, 0, 0), x_dir=(0, 0, -1), z_dir=(1, 0, 0)).offset(CUT_EXTRUDE22_START)):
        with Locations((16, 18)):
            Circle(SKETCH48_R)
        with Locations(Location((-36, 18, 0), (0, 0, 180))):
            Circle(SKETCH48_R)
    extrude(amount=CUT_EXTRUDE22_DEPTH, mode=Mode.SUBTRACT)

    # Fillet1
    fillet1_edges = [part.edges().sort_by_distance(p)[0] for p in [
        (294.974984355, 13, 35),
        (295, 13, -15),
        (5, 13, 35),
        (5, 13, -15),
    ]]
    fillet(fillet1_edges, radius=FILLET1_R)

    # Fillet2
    # the kernel refuses this fillet: 2.5 mm, written as the material it adds along each edge
    with BuildSketch(Plane(origin=(-1.25, 8, -9), x_dir=(0, 1, 0), z_dir=(1, 0, 0))) as fillet2_piece_1_section:
        with BuildLine():
            CenterArc((FILLET2_R, FILLET2_R), FILLET2_R, 180, 90)
            Line((0, FILLET2_R), (0, 0))
            Line((0, 0), (FILLET2_R, 0))
        make_face()
    fillet2_piece_1 = extrude(amount=26.25, mode=Mode.PRIVATE)
    fillet2_piece_1 = fillet2_piece_1 - Plane(origin=(0, 8, -9), x_dir=(1, 0, 0), z_dir=(0, 0, -1)) * Cylinder(5, 63, mode=Mode.PRIVATE)
    add(fillet2_piece_1)
    with BuildSketch(Plane(origin=(25, 8, 29), x_dir=(0, 0, -1), z_dir=(-1, 0, 0))) as fillet2_piece_2_section:
        with BuildLine():
            CenterArc((FILLET2_R, -FILLET2_R), FILLET2_R, 90, 90)
            Line((0, -FILLET2_R), (0, 0))
            Line((0, 0), (FILLET2_R, 0))
        make_face()
    fillet2_piece_2 = extrude(amount=26.25, mode=Mode.PRIVATE)
    fillet2_piece_2 = fillet2_piece_2 - Plane(origin=(0, 8, 29), x_dir=(1, 0, 0), z_dir=(0, 0, 1)) * Cylinder(5, 63, mode=Mode.PRIVATE)
    add(fillet2_piece_2)
    with BuildSketch(Plane(origin=(301.25, 8, -9), x_dir=(0, 0, 1), z_dir=(-1, 0, 0))) as fillet2_piece_3_section:
        with BuildLine():
            CenterArc((FILLET2_R, FILLET2_R), FILLET2_R, 180, 90)
            Line((0, FILLET2_R), (0, 0))
            Line((0, 0), (FILLET2_R, 0))
        make_face()
    fillet2_piece_3 = extrude(amount=26.25, mode=Mode.PRIVATE)
    fillet2_piece_3 = fillet2_piece_3 - Plane(origin=(300, 8, -9), x_dir=(-1, 0, 0), z_dir=(0, 0, -1)) * Cylinder(5, 63, mode=Mode.PRIVATE)
    add(fillet2_piece_3)
    with BuildSketch(Plane(origin=(275, 8, 29), x_dir=(0, 0, -1), z_dir=(1, 0, 0))) as fillet2_piece_4_section:
        with BuildLine():
            CenterArc((FILLET2_R, FILLET2_R), FILLET2_R, 180, 90)
            Line((0, FILLET2_R), (0, 0))
            Line((0, 0), (FILLET2_R, 0))
        make_face()
    fillet2_piece_4 = extrude(amount=26.224984355, mode=Mode.PRIVATE)
    fillet2_piece_4 = fillet2_piece_4 - Plane(origin=(299.974984355, 8, 29), x_dir=(-1, 0, 0), z_dir=(0, 0, 1)) * Cylinder(5, 63, mode=Mode.PRIVATE)
    add(fillet2_piece_4)

    # Fillet3
    fillet3_edges = [part.edges().sort_by_distance(p)[0] for p in [
        (284.987492178, -4.5, 29),
        (284.987492178, -4.5, 41),
        (285, -5, -9),
        (285, -5, -21),
        (15, -5, -9),
        (15, -5, -21),
        (15, -5, 29),
        (15, -5, 41),
    ]]
    fillet(fillet3_edges, radius=FILLET3_R)

    # Fillet4
    fillet4_edges = [part.edges().sort_by_distance(p)[0] for p in [
        (11, 23, -21),
        (11, 23, -9),
        (11, 23, 41),
        (11, 23, 29),
        (289, 23, -9),
        (289, 23, -21),
        (288.987492178, 23, 41),
        (288.987492178, 23, 29),
    ]]
    fillet(fillet4_edges, radius=FILLET4_R)

    # Sketch49 → Cut-Extrude23 (cut, through all)
    with BuildSketch(Plane(origin=(0, 8, 0), x_dir=(1, 0, 0), z_dir=(0, 1, 0))):
        with Locations(Location((78, -6, 0), (0, 0, 270))):
            Circle(SKETCH49_R)
        with Locations(Location((78, -14, 0), (0, 0, 270))):
            Circle(SKETCH49_R)
    extrude(amount=-CUT_EXTRUDE23_DEPTH, mode=Mode.SUBTRACT)

    # Sketch50 → Cut-Extrude24 (cut)
    with BuildSketch(Plane.ZY.offset(3)):
        with Locations((13.990606819, 7.473892718)):
            Rectangle(SKETCH50_W, SKETCH50_H)
    extrude(amount=-CUT_EXTRUDE24_DEPTH, mode=Mode.SUBTRACT)

    # Sketch51 → Cut-Extrude25 (cut)
    with BuildSketch(Plane(origin=(303, 0, 0), x_dir=(0, 0, -1), z_dir=(1, 0, 0))):
        with Locations((-18.453232298, 2.421236934)):
            Rectangle(SKETCH51_W, SKETCH51_H)
    extrude(amount=-CUT_EXTRUDE25_DEPTH, mode=Mode.SUBTRACT)

    # Sketch54 → Cut-Extrude26 (cut)
    with BuildSketch(Plane(origin=(238, 0, 0), x_dir=(0, 0, -1), z_dir=(1, 0, 0))):
        with Locations((-10, 6.5)):
            Rectangle(SKETCH54_W, SKETCH54_H)
    extrude(amount=-CUT_EXTRUDE26_DEPTH, mode=Mode.SUBTRACT)

    # Sketch55 → Boss-Extrude26 (add)
    with BuildSketch(Plane(origin=(0, 8, 0), x_dir=(1, 0, 0), z_dir=(0, 1, 0))):
        with Locations((222.5, -3)):
            Rectangle(SKETCH55_W, SKETCH55_H)
    extrude(amount=BOSS_EXTRUDE26_DEPTH)

    # Sketch56 → Cut-Extrude27 (cut, through all)
    with BuildSketch(Plane.XY.offset(6)):
        with Locations((231.5, 6.5)):
            Circle(SKETCH56_R)
        with Locations((223.5, 6.5)):
            Circle(SKETCH56_R)
    extrude(amount=-CUT_EXTRUDE27_DEPTH, mode=Mode.SUBTRACT)

    # Sketch57 → Boss-Extrude27 (add)
    with BuildSketch(Plane(origin=(0, 0, 0), x_dir=(-1, 0, 0), z_dir=(0, -1, 0))):
        with Locations((-52.5, -10)):
            Rectangle(SKETCH57_W, SKETCH57_H)
    extrude(amount=BOSS_EXTRUDE27_DEPTH)

    # Sketch58 → Cut-Extrude28 (cut)
    with BuildSketch(Plane(origin=(0, 8, 0), x_dir=(1, 0, 0), z_dir=(0, 1, 0))):
        with Locations((47.5, -10)):
            Rectangle(SKETCH58_W, SKETCH58_H)
    extrude(amount=-CUT_EXTRUDE28_DEPTH, mode=Mode.SUBTRACT)

    # Sketch59 → Cut-Extrude29 (cut, through all)
    with BuildSketch(Plane(origin=(0, 0, 0), x_dir=(1, 0, 0), z_dir=(0, 1, 0))):
        with Locations(Location((52, -6, 0), (0, 0, 270))):
            Circle(SKETCH59_R)
        with Locations(Location((45, -6, 0), (0, 0, 270))):
            Circle(SKETCH59_R)
        with Locations(Location((45, -14, 0), (0, 0, 270))):
            Circle(SKETCH59_R)
        with Locations(Location((52, -14, 0), (0, 0, 270))):
            Circle(SKETCH59_R)
    extrude(amount=-CUT_EXTRUDE29_DEPTH, mode=Mode.SUBTRACT)

    # Sketch60 → Boss-Extrude28 (add)
    with BuildSketch(Plane.XY.offset(20)):
        with Locations((112, 4)):
            Rectangle(SKETCH60_W, SKETCH60_H)
    extrude(amount=BOSS_EXTRUDE28_DEPTH)

    # Sketch61 → Cut-Extrude30 (cut, through all)
    with BuildSketch(Plane(origin=(0, 8, 0), x_dir=(1, 0, 0), z_dir=(0, 1, 0))):
        with Locations(Location((111.4, -50, 0), (0, 0, 270))):
            Circle(SKETCH61_R)
        with Locations(Location((111.4, -40, 0), (0, 0, 270))):
            Circle(SKETCH61_R)
    extrude(amount=-CUT_EXTRUDE30_DEPTH, mode=Mode.SUBTRACT)

    # Fillet5
    fillet5_edges = [part.edges().sort_by_distance(p)[0] for p in [
        (107, 4, 20),
        (117, 4, 20),
    ]]
    fillet(fillet5_edges, radius=FILLET5_R)

    # Fillet6
    # a fillet whose section is not a circle: 3 mm, written as the material it adds along each edge
    with BuildSketch(Plane(origin=(68, 0, 20), x_dir=(1, 0, 0), z_dir=(0, 0, -1))) as fillet6_piece_1:
        with BuildLine():
            Bezier((FILLET6_SIZE, 0), (0, 0), (0, FILLET6_SIZE), weights=[1, 0.176470588, 1])
            Line((0, FILLET6_SIZE), (0, 0))
            Line((0, 0), (FILLET6_SIZE, 0))
        make_face()
    extrude(amount=20)

    # Fillet7
    fillet7_edges = [part.edges().sort_by_distance(p)[0] for p in [
        (107, 4, 58),
        (117, 4, 58),
    ]]
    fillet(fillet7_edges, radius=FILLET7_R)


solid = part.part
